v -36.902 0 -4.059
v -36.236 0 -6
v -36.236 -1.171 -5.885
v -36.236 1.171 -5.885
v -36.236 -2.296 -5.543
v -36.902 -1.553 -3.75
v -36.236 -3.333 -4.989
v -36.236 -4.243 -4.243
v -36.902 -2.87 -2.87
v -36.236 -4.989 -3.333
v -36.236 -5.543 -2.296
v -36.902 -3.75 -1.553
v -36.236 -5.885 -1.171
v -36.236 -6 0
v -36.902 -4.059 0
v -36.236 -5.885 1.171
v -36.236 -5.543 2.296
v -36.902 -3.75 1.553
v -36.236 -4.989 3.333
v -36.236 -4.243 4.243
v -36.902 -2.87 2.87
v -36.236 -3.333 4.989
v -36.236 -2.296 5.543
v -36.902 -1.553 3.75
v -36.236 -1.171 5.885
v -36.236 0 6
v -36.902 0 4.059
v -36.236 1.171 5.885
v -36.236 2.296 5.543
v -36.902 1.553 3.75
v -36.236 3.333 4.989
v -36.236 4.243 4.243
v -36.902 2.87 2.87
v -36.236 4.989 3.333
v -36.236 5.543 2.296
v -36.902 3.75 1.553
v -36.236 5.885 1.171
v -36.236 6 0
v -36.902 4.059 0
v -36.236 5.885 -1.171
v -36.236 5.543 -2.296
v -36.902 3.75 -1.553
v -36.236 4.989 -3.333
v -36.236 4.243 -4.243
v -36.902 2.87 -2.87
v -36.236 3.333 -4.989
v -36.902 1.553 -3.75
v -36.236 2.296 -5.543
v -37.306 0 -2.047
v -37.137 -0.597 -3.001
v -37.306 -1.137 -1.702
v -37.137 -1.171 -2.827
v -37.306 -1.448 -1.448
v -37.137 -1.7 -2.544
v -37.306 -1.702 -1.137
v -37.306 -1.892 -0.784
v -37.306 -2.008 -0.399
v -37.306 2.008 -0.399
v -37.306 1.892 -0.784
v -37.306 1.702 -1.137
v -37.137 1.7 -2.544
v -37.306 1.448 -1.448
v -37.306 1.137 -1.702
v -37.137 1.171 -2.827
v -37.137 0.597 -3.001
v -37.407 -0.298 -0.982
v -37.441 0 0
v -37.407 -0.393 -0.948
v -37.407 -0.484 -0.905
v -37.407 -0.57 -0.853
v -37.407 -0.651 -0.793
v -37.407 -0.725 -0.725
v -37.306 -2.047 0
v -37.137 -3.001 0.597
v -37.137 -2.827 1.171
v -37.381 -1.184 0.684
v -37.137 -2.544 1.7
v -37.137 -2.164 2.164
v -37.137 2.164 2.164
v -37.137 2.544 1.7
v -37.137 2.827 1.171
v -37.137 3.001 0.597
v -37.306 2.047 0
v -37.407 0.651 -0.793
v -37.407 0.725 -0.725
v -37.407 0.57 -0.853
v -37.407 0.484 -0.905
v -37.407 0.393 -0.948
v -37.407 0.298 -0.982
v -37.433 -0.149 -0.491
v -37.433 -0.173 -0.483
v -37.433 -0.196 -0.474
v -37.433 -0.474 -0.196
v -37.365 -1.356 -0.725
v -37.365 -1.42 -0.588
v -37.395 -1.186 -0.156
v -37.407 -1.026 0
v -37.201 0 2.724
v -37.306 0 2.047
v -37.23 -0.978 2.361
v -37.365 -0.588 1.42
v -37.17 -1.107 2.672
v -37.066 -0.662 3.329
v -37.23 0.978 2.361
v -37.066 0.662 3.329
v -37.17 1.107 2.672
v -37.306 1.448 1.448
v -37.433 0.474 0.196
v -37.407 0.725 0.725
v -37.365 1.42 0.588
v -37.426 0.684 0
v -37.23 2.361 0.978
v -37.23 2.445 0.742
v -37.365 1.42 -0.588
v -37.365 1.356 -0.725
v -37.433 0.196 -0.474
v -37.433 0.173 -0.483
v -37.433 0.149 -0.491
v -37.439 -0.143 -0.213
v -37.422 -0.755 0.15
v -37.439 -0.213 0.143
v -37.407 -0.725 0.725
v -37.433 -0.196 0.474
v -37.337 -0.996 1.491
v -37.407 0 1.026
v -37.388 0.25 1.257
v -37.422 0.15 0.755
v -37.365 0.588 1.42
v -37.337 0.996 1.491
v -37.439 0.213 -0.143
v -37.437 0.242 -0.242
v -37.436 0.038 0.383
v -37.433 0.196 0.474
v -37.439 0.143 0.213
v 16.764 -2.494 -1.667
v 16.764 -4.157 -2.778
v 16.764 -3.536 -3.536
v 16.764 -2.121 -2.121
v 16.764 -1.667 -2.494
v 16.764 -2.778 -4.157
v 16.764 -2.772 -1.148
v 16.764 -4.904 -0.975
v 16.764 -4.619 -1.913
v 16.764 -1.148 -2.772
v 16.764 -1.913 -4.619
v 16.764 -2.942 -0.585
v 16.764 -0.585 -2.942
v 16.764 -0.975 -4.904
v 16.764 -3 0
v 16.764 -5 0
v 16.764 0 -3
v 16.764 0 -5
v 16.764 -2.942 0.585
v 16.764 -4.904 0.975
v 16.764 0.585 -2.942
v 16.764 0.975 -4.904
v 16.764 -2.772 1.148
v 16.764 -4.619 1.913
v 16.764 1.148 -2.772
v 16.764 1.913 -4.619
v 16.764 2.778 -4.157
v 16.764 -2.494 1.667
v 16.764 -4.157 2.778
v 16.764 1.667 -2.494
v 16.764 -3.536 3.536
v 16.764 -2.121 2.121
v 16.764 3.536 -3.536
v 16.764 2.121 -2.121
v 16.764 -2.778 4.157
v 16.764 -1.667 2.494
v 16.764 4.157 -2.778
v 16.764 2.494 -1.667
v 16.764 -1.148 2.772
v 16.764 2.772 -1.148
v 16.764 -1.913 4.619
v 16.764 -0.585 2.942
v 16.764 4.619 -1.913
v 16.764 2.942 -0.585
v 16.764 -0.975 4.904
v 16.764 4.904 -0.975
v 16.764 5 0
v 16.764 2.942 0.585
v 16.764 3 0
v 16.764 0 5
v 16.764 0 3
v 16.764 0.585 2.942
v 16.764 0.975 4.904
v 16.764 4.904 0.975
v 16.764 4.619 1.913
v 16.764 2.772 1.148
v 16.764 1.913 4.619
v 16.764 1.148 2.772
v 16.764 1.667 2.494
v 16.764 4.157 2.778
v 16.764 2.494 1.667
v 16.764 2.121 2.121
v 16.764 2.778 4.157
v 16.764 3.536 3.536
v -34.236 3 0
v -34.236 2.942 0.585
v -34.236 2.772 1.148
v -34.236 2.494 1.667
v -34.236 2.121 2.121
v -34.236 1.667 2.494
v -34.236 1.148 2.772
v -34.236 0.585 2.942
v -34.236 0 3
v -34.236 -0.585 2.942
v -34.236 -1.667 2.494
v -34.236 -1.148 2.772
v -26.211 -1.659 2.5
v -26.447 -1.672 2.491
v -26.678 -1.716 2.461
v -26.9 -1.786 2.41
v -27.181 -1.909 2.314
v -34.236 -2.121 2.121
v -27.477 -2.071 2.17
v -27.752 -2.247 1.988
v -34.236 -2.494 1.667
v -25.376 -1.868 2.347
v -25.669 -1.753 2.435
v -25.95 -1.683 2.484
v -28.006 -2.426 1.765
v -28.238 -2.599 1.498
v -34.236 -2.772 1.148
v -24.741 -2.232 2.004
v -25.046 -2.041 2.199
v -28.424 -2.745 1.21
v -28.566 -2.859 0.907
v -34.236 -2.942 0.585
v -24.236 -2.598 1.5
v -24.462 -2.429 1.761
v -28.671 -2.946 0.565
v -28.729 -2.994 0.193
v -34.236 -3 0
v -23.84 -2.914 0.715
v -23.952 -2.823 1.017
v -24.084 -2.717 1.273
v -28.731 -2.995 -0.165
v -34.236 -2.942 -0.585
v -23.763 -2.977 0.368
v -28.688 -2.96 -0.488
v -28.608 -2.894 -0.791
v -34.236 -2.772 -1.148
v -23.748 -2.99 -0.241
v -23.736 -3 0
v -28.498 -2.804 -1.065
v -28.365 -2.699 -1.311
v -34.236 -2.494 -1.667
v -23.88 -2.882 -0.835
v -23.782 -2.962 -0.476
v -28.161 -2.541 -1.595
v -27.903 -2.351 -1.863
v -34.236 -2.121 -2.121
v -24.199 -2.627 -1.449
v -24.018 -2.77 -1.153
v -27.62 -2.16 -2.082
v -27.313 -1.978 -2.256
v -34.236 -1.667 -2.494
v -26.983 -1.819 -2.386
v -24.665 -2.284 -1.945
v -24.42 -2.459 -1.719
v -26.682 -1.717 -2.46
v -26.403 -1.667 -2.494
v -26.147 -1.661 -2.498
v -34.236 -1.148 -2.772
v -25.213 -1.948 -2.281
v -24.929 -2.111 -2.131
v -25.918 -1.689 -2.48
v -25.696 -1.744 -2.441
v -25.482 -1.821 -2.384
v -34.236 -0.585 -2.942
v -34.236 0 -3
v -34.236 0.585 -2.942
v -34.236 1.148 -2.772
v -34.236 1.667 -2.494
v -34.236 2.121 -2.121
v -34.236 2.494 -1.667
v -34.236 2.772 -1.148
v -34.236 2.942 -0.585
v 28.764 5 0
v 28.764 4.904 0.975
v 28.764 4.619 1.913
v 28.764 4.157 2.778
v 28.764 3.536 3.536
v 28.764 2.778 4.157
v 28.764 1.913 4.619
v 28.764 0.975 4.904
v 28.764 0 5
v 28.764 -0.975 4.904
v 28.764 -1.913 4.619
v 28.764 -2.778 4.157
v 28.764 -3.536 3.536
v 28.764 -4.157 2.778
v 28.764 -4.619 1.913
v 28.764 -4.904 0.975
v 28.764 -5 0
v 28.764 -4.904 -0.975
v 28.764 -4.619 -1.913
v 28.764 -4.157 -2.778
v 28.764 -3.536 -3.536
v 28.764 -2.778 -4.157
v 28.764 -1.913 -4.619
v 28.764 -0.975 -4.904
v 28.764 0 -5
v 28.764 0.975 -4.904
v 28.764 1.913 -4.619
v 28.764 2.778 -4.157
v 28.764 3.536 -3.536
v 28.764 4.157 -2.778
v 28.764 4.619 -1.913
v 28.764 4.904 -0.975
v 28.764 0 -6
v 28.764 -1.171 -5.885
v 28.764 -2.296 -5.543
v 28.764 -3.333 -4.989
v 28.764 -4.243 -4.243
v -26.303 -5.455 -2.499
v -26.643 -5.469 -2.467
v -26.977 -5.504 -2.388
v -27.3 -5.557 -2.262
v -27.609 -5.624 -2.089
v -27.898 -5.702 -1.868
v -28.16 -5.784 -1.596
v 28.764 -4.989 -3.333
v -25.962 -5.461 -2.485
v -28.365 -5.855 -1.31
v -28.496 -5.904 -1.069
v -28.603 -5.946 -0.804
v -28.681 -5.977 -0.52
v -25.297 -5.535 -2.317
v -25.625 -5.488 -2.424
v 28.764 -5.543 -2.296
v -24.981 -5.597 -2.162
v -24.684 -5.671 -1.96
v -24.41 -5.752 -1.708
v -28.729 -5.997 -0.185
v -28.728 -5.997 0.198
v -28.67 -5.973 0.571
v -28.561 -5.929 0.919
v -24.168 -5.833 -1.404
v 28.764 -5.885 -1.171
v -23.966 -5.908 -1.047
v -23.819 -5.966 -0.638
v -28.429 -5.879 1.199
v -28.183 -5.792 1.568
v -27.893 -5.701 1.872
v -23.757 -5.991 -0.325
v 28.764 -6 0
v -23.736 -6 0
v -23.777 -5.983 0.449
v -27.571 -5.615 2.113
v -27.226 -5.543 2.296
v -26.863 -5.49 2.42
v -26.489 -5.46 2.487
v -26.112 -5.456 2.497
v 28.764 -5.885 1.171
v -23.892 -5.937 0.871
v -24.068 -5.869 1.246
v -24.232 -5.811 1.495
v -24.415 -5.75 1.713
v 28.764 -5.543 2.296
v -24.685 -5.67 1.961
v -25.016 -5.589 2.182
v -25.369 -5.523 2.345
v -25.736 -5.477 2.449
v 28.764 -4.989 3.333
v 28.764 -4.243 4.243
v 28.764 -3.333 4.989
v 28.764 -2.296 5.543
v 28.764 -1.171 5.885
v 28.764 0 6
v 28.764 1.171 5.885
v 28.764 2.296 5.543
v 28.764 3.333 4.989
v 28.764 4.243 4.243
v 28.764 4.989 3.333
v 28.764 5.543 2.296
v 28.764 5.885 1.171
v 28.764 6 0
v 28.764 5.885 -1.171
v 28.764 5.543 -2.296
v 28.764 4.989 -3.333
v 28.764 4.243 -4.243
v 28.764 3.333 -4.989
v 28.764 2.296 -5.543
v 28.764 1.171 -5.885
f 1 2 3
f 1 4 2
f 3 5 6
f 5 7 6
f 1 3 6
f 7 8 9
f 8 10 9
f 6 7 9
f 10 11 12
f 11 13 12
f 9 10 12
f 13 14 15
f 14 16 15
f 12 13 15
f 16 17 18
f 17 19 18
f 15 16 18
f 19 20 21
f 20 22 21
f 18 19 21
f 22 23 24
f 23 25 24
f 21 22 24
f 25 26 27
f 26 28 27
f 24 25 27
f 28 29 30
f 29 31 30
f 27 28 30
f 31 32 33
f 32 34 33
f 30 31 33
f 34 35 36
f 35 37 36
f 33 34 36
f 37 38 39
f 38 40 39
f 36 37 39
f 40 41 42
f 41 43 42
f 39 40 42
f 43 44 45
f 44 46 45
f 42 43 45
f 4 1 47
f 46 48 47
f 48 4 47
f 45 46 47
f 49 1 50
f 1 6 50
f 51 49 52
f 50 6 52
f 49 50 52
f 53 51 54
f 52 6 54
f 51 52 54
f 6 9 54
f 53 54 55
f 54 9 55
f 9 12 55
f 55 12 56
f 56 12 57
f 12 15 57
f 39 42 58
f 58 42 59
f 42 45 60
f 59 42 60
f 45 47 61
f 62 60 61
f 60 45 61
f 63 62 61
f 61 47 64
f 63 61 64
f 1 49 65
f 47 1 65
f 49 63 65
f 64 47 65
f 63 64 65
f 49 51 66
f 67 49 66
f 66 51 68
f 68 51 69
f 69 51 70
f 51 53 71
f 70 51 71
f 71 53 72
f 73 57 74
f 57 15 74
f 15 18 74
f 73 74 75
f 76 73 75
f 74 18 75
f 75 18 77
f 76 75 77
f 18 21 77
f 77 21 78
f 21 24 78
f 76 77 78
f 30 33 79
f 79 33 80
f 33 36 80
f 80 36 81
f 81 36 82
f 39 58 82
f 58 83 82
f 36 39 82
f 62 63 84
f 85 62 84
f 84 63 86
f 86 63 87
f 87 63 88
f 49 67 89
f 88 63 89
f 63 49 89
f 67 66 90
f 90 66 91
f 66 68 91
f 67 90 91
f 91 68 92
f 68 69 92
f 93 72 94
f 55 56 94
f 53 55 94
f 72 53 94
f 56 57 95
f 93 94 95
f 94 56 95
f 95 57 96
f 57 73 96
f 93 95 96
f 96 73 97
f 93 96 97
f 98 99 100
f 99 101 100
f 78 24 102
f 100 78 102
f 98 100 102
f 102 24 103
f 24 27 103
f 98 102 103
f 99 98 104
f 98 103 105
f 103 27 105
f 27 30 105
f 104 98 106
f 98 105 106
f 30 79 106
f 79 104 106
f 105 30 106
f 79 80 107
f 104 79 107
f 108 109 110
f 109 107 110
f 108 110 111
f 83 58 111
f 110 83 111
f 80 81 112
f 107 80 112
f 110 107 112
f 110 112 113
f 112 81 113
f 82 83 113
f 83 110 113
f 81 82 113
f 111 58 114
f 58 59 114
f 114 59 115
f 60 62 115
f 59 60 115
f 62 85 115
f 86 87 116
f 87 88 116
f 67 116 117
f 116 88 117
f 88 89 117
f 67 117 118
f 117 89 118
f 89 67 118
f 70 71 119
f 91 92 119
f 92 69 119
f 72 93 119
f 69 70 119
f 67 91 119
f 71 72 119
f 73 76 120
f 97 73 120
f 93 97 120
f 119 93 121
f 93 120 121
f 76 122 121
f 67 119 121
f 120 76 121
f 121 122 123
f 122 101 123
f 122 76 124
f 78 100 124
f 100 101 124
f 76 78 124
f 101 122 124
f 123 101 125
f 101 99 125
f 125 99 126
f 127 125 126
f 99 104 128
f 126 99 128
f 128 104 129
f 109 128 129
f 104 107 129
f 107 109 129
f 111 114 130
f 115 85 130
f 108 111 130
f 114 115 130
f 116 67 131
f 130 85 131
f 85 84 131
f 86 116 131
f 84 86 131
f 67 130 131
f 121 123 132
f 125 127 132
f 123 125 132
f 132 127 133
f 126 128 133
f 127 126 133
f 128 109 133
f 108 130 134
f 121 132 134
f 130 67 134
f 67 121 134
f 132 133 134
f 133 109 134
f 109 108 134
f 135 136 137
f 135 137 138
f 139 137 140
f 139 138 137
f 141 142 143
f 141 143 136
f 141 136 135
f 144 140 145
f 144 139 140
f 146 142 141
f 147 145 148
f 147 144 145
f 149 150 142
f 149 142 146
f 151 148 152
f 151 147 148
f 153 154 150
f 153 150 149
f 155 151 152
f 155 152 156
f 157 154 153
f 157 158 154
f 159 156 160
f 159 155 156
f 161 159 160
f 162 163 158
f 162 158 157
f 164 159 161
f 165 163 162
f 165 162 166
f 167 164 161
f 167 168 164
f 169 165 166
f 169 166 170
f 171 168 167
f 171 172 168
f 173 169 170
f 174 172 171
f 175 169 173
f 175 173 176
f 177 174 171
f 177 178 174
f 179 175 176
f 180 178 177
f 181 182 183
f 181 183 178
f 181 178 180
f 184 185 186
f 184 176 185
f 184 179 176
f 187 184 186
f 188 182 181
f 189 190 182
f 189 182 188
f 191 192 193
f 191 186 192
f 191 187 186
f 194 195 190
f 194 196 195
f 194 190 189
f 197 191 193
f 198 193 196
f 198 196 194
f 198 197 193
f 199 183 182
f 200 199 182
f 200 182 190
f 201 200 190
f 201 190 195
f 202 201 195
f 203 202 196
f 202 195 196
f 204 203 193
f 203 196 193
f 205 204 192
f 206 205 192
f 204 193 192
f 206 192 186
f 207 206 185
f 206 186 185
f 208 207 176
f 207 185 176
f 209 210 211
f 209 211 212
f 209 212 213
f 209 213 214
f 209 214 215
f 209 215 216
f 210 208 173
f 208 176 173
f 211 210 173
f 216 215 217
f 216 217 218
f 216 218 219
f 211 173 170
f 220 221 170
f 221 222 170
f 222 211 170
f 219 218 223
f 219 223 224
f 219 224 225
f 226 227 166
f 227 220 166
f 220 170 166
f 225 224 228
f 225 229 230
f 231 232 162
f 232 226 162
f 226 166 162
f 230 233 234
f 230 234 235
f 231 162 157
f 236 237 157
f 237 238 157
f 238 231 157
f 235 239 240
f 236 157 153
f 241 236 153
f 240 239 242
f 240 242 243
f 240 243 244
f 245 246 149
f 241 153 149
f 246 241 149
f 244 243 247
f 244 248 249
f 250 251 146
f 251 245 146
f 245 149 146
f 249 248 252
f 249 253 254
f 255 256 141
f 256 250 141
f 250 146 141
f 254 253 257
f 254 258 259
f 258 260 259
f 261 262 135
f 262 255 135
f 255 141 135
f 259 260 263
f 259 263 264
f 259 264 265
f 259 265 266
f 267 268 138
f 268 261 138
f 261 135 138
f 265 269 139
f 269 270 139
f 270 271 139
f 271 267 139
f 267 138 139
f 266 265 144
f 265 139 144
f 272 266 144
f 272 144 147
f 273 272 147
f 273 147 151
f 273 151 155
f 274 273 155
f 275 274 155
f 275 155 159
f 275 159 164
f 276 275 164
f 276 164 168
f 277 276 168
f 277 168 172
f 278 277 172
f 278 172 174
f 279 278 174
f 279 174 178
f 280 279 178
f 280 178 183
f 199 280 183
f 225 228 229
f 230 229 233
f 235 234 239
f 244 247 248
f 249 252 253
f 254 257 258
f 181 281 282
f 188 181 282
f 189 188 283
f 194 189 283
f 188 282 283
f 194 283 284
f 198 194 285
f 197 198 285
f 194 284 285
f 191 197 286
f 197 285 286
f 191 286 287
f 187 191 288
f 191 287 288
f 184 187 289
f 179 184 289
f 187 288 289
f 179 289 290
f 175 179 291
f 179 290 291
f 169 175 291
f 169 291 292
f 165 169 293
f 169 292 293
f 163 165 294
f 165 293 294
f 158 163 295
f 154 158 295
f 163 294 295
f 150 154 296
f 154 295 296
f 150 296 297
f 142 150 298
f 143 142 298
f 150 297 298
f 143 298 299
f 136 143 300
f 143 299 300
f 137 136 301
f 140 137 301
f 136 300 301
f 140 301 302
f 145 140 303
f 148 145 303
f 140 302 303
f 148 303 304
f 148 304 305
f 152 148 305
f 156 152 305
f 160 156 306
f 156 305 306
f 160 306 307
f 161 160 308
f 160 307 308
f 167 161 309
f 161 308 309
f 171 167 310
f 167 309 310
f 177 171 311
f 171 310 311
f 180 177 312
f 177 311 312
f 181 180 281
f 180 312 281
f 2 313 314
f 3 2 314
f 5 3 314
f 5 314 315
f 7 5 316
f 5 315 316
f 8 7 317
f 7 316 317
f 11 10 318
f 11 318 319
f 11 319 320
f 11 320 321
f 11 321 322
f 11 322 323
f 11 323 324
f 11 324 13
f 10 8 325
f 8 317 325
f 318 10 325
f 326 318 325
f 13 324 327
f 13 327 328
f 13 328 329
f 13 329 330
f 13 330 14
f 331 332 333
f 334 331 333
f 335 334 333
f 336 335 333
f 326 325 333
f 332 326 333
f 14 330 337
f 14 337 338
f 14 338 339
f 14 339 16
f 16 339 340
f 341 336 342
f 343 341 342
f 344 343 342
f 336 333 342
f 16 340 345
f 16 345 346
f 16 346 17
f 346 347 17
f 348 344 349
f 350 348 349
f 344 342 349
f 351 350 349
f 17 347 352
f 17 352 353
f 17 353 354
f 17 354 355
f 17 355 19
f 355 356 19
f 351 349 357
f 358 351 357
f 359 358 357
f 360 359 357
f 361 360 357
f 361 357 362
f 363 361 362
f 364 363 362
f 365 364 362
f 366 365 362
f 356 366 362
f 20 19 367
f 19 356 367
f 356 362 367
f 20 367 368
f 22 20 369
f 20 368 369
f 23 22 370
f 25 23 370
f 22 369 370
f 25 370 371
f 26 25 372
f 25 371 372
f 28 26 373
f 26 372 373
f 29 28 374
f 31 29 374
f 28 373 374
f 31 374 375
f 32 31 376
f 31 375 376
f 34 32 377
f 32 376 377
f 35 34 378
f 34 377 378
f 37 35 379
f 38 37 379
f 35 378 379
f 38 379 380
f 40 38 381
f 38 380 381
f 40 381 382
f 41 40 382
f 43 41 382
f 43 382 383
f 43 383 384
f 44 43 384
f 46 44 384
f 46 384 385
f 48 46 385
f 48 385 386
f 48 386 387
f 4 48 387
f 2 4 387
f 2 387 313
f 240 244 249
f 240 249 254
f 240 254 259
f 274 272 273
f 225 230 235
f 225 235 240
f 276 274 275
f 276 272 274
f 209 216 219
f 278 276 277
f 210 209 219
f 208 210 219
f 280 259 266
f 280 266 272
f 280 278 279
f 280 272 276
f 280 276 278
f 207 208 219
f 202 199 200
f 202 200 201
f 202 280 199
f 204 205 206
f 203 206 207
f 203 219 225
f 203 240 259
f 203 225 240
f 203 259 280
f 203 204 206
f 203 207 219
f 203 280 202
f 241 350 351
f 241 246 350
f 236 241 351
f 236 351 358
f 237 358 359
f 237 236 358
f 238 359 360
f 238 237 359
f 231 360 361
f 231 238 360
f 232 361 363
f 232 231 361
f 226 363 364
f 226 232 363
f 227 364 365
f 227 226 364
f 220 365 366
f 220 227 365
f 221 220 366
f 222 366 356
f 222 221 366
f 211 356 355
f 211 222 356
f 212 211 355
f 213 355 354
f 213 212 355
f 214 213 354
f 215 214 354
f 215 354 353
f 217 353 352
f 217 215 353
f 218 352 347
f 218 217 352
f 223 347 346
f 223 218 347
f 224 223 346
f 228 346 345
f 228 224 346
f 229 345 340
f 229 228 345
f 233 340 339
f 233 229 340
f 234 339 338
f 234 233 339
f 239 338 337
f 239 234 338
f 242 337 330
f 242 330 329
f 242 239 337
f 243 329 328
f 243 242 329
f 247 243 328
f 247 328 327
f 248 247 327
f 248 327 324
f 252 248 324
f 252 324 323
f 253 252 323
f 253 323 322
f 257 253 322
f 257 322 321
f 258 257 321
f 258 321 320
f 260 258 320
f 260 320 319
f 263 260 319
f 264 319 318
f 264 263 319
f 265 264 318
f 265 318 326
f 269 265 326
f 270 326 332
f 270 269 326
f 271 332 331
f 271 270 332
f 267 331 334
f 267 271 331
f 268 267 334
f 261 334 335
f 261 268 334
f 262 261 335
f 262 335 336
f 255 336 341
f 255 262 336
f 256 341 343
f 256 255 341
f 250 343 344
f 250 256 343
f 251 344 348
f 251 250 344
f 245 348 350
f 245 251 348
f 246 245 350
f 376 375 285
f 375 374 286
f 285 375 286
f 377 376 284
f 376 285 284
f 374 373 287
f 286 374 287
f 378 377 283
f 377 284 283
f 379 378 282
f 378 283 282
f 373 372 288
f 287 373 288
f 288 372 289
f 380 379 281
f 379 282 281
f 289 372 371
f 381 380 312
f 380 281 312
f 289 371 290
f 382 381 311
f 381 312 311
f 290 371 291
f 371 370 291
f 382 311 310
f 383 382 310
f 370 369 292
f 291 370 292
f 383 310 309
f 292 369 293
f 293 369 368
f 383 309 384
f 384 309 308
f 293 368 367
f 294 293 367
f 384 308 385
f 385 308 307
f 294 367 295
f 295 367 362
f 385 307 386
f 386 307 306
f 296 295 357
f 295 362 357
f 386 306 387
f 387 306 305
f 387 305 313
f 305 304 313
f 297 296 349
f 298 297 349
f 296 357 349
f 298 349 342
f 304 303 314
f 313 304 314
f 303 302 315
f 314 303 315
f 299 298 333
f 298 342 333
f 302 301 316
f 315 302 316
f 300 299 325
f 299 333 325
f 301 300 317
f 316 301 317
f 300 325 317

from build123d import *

# Parameters (mm, degrees)
F2_R     = 3
F3_DEPTH = 63
F4_R     = 5
F5_DEPTH = 12
F6_W     = 2.5
F6_H     = 11.932325


with BuildPart() as f1:
    # F0 (on Front) → F1 (revolve)
    with BuildSketch(Plane.XZ):
        with BuildLine():
            ThreePointArc((-37.441203, 0), (-37.136928, -3.059921), (-36.236017, -6))
            Line((-36.236017, -6), (28.763983, -6))
            Line((28.763983, -6), (28.763983, 0))
            Line((28.763983, 0), (-37.441203, 0))
        make_face()
    revolve(axis=Axis((-4.33861, 0, 0), (-1, 0, 0)))

    # F2 (on face) → F3 (cut)
    with BuildSketch(Plane.YZ.offset(28.763983)):
        Circle(F2_R)
    extrude(amount=-F3_DEPTH, mode=Mode.SUBTRACT)

    # F4 (on face) → F5 (cut)
    with BuildSketch(Plane.YZ.offset(28.763983)):
        Circle(F4_R)
    extrude(amount=-F5_DEPTH, mode=Mode.SUBTRACT)

    # F6 (on Top) → F7 (revolve, cut)
    with BuildSketch(Plane.XY):
        with Locations((-24.986017, -5.966162)):
            Rectangle(F6_W, F6_H)
    revolve(axis=Axis((-26.236017, -5.966163, 0), (0, -1, 0)), mode=Mode.SUBTRACT)


solid = f1.part
